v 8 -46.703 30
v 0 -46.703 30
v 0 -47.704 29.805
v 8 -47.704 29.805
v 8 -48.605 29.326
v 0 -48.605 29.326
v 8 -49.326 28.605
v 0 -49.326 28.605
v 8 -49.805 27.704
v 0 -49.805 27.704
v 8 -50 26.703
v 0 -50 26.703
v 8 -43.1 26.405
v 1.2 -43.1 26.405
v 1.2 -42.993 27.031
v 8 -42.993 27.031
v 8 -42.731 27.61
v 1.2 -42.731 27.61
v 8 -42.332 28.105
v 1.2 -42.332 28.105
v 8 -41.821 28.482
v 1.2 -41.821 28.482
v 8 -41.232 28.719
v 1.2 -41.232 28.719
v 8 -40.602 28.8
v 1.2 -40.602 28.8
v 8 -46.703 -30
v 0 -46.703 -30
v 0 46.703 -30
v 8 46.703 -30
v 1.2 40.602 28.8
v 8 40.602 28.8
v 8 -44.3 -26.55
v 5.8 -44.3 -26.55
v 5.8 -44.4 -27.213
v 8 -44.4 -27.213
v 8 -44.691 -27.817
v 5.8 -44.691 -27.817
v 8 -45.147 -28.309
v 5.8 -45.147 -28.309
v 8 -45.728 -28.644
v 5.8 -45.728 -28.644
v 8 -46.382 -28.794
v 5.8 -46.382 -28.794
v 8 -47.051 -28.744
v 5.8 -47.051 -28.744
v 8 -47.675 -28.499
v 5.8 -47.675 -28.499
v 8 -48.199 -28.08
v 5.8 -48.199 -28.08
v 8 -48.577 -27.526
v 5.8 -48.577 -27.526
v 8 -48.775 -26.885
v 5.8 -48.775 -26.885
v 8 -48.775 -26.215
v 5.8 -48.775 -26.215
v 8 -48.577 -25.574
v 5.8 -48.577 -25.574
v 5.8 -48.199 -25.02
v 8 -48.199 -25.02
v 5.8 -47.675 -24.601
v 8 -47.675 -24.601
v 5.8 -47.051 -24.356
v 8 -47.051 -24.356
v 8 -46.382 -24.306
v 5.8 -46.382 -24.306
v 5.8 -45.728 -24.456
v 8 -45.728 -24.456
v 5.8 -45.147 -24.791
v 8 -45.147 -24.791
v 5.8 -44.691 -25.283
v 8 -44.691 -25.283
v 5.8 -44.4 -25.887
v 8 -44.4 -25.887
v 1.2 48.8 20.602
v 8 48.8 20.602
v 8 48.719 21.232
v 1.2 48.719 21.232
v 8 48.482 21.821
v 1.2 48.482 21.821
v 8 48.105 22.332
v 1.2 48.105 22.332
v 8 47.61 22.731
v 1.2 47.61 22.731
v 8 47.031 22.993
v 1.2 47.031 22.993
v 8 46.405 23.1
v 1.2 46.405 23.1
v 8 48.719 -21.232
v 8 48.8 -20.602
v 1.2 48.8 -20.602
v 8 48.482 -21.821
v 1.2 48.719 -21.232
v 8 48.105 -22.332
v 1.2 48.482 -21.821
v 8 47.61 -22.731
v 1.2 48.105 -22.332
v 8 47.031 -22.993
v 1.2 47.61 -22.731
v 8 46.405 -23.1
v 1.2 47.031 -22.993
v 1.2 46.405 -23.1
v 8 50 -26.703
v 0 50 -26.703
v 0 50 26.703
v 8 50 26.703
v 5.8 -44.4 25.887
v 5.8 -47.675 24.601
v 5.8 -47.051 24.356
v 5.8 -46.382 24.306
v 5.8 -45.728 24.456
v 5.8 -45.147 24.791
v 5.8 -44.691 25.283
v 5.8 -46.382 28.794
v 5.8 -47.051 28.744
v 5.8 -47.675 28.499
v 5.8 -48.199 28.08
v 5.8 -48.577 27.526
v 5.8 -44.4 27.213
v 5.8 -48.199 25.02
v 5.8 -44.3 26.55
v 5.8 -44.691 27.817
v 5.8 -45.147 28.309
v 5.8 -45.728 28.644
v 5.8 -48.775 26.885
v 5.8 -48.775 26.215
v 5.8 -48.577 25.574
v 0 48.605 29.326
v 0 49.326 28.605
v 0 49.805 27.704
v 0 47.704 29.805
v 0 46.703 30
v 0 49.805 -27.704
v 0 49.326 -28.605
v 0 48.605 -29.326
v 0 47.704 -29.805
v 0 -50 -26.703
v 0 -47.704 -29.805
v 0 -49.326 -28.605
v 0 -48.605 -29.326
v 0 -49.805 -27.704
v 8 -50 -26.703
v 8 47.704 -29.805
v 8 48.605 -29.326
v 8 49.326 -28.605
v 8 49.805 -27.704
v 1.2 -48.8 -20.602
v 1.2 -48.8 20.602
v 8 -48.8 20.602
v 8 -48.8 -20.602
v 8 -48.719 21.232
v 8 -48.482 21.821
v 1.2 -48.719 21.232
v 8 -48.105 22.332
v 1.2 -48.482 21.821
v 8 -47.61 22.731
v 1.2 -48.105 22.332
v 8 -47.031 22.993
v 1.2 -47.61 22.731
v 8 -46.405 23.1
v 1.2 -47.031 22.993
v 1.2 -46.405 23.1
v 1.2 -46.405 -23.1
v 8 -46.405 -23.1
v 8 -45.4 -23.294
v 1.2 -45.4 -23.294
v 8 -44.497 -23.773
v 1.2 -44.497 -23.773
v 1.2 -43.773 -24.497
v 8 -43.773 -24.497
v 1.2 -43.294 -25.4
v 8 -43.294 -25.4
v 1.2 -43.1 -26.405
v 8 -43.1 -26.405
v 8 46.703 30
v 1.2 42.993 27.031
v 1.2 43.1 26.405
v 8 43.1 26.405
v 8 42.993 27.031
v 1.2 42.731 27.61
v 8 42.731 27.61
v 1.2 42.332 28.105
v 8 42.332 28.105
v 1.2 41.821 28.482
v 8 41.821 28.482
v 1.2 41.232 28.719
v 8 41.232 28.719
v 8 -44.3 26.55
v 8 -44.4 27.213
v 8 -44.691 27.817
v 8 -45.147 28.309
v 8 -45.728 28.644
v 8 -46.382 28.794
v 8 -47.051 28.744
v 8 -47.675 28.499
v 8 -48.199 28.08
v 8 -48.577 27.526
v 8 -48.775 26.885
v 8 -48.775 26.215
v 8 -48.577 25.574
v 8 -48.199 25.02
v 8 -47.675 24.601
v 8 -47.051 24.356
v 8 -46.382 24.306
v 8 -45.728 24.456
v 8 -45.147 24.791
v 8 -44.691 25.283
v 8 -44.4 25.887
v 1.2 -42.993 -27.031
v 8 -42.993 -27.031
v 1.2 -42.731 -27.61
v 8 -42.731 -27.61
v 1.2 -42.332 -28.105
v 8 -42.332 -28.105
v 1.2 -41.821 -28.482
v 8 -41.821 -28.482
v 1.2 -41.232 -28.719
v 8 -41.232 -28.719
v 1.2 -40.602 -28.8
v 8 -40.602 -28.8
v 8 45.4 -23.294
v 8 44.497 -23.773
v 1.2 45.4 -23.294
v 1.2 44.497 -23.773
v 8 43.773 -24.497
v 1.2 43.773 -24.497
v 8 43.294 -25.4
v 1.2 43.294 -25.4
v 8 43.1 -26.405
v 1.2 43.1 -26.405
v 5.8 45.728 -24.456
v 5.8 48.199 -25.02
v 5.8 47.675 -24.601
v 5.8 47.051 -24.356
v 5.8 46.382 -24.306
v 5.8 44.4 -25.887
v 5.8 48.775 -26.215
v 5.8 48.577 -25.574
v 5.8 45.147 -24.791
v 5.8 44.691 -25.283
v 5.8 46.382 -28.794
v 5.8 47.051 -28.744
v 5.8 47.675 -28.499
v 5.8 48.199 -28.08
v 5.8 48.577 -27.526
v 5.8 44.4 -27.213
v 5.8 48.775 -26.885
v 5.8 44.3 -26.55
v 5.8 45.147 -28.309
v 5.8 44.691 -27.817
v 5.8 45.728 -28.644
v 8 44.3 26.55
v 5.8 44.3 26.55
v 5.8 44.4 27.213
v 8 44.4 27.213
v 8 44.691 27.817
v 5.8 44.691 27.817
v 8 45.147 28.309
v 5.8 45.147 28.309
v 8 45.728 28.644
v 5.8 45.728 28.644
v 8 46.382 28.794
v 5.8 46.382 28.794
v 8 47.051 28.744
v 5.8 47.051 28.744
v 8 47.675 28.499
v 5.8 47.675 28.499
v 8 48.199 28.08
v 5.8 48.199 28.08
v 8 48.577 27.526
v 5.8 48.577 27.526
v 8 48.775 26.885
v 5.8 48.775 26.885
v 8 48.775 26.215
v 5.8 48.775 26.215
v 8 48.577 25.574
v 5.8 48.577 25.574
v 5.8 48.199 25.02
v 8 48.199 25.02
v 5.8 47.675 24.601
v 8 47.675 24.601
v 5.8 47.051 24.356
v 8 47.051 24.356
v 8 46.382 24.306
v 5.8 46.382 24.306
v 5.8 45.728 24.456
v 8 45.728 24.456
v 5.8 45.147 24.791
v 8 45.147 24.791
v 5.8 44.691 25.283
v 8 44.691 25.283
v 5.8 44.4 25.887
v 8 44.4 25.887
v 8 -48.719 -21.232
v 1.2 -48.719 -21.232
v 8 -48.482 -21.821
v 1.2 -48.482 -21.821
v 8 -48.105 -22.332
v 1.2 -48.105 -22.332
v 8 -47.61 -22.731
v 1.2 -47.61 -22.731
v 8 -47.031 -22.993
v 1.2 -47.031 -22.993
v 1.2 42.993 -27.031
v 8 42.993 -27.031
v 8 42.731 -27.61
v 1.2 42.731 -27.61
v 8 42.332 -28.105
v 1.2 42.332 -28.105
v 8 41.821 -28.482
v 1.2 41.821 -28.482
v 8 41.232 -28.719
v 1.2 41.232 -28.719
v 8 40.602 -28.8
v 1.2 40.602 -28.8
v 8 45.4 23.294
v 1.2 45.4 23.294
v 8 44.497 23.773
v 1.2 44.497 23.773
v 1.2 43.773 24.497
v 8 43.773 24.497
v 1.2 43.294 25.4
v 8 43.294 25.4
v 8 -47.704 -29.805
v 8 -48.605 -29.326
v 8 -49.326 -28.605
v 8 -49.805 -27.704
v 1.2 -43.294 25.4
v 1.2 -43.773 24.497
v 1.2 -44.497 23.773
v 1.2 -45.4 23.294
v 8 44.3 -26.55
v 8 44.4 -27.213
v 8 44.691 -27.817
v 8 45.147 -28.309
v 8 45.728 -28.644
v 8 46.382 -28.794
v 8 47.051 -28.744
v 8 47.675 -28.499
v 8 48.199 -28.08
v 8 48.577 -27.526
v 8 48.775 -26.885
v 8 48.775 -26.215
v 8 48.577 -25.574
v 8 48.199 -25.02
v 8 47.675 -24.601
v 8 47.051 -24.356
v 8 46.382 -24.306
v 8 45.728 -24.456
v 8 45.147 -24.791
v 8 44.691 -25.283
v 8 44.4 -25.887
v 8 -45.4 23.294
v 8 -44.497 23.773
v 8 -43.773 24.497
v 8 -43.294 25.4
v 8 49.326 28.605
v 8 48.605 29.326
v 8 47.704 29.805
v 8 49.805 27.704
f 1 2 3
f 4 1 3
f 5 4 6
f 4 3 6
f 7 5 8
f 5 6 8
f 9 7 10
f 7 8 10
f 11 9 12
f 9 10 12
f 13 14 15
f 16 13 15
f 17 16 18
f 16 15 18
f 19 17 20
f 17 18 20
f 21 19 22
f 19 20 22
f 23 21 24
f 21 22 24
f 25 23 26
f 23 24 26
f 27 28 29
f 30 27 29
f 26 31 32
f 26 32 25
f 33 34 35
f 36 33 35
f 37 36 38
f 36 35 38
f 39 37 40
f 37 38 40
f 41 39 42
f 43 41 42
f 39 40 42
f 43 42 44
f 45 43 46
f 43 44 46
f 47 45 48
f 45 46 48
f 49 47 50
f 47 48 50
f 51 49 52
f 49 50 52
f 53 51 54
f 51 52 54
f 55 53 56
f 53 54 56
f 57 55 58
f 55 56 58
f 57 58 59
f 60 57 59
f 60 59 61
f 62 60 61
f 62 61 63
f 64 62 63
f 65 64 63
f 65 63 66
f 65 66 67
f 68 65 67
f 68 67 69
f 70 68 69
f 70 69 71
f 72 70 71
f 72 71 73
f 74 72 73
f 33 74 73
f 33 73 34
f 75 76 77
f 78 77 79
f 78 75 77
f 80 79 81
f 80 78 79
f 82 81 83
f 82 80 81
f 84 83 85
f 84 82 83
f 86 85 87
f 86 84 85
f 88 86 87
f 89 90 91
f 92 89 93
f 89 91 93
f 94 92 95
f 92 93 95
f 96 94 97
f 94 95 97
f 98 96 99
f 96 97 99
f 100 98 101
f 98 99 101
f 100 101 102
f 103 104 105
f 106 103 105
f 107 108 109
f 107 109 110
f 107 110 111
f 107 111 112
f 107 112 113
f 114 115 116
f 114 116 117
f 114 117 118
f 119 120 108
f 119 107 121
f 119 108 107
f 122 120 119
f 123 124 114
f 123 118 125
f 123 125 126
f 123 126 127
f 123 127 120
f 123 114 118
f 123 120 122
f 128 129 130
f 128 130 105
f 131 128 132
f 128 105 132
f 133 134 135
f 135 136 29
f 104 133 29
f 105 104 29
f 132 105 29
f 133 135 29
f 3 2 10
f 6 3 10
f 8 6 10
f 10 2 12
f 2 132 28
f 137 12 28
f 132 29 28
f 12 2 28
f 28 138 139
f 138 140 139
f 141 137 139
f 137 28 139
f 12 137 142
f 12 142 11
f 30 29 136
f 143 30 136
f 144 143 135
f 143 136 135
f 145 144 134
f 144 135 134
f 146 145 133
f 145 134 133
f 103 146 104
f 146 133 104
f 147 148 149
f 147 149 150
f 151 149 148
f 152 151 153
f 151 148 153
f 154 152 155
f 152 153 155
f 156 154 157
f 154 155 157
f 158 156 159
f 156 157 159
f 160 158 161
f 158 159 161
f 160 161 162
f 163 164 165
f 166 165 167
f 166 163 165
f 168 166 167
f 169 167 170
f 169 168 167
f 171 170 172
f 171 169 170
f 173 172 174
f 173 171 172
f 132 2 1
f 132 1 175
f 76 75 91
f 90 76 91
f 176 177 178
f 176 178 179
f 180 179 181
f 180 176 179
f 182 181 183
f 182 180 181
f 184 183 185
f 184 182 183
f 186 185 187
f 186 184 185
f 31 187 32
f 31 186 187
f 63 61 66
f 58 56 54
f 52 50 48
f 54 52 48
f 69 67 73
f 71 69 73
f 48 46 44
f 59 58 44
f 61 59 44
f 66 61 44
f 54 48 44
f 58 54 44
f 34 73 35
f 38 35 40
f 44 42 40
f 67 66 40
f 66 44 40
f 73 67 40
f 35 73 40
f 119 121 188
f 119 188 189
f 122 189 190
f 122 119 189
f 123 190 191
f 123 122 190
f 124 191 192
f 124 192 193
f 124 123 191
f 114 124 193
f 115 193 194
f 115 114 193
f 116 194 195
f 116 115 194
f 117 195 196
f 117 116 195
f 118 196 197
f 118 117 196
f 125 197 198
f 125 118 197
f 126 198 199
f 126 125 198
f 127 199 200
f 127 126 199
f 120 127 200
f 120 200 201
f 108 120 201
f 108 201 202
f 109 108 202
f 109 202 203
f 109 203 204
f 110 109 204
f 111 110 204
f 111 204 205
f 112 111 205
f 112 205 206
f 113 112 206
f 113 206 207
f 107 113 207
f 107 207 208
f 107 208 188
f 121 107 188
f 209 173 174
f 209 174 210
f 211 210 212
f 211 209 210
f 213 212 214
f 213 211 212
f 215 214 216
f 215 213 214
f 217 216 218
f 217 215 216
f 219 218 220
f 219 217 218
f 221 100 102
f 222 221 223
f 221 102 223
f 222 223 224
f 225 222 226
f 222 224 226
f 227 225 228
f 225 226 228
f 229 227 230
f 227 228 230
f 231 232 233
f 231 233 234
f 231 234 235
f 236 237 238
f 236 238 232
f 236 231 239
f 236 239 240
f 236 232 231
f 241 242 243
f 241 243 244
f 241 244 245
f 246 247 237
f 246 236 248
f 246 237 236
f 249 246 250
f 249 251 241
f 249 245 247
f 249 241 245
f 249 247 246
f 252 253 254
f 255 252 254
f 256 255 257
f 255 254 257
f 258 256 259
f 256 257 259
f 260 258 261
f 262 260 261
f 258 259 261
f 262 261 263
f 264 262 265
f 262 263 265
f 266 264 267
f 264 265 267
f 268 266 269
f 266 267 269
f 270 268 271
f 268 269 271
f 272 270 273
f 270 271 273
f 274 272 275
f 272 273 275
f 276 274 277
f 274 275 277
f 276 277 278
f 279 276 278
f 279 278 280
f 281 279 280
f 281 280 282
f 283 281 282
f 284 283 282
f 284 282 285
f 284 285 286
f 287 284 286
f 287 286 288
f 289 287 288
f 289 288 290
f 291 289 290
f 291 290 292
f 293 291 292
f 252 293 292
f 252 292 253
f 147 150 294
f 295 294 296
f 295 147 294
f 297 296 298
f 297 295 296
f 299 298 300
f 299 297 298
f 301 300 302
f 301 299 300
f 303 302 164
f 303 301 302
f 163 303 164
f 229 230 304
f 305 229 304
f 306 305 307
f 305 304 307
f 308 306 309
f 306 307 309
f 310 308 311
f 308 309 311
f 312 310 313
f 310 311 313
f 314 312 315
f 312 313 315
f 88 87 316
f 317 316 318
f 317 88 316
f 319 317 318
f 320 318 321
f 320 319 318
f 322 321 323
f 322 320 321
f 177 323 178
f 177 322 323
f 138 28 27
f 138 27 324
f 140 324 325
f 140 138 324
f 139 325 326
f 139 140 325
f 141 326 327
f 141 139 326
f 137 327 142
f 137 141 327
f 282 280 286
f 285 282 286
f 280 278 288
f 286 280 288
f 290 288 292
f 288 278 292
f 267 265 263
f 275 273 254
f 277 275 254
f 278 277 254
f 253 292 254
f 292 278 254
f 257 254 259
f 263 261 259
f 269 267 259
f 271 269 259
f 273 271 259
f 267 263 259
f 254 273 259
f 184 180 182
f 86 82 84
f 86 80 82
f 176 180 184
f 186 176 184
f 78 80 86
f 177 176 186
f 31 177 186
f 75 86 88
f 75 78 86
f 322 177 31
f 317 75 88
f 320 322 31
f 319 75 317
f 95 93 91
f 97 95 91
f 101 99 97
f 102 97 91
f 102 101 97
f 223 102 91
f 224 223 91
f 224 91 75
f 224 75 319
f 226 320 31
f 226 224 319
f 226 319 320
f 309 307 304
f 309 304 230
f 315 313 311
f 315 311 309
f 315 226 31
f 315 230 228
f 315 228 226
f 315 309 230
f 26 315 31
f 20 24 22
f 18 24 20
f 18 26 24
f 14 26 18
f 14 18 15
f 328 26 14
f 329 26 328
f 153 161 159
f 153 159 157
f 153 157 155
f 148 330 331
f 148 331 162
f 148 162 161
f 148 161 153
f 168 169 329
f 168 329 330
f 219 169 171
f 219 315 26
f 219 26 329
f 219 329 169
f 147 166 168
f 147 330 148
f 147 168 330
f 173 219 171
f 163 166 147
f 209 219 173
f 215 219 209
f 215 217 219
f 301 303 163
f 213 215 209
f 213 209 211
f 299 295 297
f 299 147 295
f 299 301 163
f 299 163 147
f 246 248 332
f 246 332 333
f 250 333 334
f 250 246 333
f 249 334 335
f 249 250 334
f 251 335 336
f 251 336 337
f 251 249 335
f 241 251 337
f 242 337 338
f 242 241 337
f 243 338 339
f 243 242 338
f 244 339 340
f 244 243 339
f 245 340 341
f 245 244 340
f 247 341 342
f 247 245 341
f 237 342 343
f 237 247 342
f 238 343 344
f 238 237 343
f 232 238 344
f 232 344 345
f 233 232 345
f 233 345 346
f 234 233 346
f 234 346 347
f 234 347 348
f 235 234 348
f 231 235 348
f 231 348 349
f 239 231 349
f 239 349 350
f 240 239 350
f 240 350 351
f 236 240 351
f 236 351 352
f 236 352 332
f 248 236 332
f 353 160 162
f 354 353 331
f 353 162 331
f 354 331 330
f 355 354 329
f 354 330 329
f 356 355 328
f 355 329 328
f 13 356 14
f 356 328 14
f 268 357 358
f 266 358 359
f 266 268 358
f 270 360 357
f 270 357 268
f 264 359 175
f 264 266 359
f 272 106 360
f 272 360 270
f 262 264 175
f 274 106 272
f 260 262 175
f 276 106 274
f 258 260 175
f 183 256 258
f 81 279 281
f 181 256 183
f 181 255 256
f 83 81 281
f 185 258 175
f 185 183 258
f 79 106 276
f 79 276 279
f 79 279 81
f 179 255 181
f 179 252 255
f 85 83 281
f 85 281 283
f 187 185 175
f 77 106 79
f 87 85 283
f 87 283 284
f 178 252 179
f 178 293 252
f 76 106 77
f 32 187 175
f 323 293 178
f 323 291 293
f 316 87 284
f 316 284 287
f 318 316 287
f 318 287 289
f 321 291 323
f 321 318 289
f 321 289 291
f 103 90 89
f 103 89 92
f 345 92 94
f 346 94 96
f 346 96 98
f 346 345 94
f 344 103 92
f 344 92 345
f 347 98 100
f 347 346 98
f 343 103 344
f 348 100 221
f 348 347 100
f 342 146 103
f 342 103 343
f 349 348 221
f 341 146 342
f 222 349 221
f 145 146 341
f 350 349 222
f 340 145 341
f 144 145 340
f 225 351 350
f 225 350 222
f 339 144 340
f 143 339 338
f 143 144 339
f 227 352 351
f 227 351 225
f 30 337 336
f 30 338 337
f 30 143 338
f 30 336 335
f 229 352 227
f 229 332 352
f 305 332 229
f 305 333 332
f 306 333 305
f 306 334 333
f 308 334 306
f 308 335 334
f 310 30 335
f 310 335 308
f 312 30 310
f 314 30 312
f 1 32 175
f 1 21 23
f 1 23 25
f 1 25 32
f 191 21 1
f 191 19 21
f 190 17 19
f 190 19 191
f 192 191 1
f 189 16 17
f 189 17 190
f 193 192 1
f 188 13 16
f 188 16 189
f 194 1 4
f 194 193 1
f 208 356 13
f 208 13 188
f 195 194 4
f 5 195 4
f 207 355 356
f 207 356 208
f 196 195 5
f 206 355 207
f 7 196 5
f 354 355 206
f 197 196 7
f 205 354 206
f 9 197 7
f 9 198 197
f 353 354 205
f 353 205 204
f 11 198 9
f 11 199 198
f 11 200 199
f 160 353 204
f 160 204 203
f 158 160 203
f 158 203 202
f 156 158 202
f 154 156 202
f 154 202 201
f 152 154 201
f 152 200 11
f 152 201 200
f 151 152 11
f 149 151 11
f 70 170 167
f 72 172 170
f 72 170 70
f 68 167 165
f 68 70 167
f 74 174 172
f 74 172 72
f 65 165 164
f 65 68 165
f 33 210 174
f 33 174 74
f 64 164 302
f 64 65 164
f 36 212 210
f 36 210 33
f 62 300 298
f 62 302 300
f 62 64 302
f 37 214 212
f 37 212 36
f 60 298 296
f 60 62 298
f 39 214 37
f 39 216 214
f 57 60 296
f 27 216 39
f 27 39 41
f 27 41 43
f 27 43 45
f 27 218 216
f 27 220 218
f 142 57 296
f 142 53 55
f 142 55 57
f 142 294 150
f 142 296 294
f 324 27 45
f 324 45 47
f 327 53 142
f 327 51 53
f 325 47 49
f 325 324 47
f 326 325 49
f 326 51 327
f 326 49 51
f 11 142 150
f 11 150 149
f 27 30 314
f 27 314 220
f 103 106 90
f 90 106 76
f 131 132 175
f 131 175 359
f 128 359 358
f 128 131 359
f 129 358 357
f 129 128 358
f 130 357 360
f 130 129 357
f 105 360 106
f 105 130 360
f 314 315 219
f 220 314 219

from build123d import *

# Parameters (mm, degrees)
F0_R     = 2.25
F1_DEPTH = 8
F2_DEPTH = 1.2
F3_DEPTH = 5.8


with BuildPart() as f1:
    # F0 (on Right) → F1 (new body)
    with BuildSketch(Plane.YZ):
        with BuildLine():
            Line((-50, 0), (-48.8, 0))
            Line((-48.8, 0), (-48.8, 20.601839))
            ThreePointArc((-48.8, 20.601839), (-48.104502, 22.332091), (-46.404982, 23.099634))
            ThreePointArc((-46.404982, 23.099634), (-44.108069, 24.108069), (-43.099634, 26.404982))
            ThreePointArc((-43.099634, 26.404982), (-42.332091, 28.104502), (-40.601839, 28.8))
            Line((-40.601839, 28.8), (0, 28.8))
            Line((0, 28.8), (0, 30))
            Line((0, 30), (-46.396522, 30))
            Line((-46.396522, 30), (-46.703478, 30))
            ThreePointArc((-46.703478, 30), (-48.991931, 28.991931), (-50, 26.703478))
            Line((-50, 26.703478), (-50, 26.396522))
            Line((-50, 26.396522), (-50, 0))
        make_face()
        with Locations((-46.55, 26.55)):
            Circle(F0_R, mode=Mode.SUBTRACT)
    extrude(amount=F1_DEPTH)

    # F0 (on Right) → F2 (join)
    with BuildSketch(Plane.YZ):
        with BuildLine():
            Line((-48.8, 0), (0, 0))
            Line((0, 0), (0, 28.8))
            Line((0, 28.8), (-40.601839, 28.8))
            ThreePointArc((-40.601839, 28.8), (-42.332091, 28.104502), (-43.099634, 26.404982))
            ThreePointArc((-43.099634, 26.404982), (-44.108069, 24.108069), (-46.404982, 23.099634))
            ThreePointArc((-46.404982, 23.099634), (-48.104502, 22.332091), (-48.8, 20.601839))
            Line((-48.8, 20.601839), (-48.8, 0))
        make_face()
    extrude(amount=F2_DEPTH)

    # F0 (on Right) → F3 (join)
    with BuildSketch(Plane.YZ):
        with Locations((-46.55, 26.55)):
            Circle(F0_R)
    extrude(amount=F3_DEPTH)

    # F4: F1 across plane


with BuildPart() as f1_1:
    add(f1.part)
    add(f1.part.mirror(Plane.XZ))

    # F5: F1 across plane


with BuildPart() as f1_2:
    add(f1_1.part)
    add(f1_1.part.mirror(Plane.XY))


solid = f1_2.part
